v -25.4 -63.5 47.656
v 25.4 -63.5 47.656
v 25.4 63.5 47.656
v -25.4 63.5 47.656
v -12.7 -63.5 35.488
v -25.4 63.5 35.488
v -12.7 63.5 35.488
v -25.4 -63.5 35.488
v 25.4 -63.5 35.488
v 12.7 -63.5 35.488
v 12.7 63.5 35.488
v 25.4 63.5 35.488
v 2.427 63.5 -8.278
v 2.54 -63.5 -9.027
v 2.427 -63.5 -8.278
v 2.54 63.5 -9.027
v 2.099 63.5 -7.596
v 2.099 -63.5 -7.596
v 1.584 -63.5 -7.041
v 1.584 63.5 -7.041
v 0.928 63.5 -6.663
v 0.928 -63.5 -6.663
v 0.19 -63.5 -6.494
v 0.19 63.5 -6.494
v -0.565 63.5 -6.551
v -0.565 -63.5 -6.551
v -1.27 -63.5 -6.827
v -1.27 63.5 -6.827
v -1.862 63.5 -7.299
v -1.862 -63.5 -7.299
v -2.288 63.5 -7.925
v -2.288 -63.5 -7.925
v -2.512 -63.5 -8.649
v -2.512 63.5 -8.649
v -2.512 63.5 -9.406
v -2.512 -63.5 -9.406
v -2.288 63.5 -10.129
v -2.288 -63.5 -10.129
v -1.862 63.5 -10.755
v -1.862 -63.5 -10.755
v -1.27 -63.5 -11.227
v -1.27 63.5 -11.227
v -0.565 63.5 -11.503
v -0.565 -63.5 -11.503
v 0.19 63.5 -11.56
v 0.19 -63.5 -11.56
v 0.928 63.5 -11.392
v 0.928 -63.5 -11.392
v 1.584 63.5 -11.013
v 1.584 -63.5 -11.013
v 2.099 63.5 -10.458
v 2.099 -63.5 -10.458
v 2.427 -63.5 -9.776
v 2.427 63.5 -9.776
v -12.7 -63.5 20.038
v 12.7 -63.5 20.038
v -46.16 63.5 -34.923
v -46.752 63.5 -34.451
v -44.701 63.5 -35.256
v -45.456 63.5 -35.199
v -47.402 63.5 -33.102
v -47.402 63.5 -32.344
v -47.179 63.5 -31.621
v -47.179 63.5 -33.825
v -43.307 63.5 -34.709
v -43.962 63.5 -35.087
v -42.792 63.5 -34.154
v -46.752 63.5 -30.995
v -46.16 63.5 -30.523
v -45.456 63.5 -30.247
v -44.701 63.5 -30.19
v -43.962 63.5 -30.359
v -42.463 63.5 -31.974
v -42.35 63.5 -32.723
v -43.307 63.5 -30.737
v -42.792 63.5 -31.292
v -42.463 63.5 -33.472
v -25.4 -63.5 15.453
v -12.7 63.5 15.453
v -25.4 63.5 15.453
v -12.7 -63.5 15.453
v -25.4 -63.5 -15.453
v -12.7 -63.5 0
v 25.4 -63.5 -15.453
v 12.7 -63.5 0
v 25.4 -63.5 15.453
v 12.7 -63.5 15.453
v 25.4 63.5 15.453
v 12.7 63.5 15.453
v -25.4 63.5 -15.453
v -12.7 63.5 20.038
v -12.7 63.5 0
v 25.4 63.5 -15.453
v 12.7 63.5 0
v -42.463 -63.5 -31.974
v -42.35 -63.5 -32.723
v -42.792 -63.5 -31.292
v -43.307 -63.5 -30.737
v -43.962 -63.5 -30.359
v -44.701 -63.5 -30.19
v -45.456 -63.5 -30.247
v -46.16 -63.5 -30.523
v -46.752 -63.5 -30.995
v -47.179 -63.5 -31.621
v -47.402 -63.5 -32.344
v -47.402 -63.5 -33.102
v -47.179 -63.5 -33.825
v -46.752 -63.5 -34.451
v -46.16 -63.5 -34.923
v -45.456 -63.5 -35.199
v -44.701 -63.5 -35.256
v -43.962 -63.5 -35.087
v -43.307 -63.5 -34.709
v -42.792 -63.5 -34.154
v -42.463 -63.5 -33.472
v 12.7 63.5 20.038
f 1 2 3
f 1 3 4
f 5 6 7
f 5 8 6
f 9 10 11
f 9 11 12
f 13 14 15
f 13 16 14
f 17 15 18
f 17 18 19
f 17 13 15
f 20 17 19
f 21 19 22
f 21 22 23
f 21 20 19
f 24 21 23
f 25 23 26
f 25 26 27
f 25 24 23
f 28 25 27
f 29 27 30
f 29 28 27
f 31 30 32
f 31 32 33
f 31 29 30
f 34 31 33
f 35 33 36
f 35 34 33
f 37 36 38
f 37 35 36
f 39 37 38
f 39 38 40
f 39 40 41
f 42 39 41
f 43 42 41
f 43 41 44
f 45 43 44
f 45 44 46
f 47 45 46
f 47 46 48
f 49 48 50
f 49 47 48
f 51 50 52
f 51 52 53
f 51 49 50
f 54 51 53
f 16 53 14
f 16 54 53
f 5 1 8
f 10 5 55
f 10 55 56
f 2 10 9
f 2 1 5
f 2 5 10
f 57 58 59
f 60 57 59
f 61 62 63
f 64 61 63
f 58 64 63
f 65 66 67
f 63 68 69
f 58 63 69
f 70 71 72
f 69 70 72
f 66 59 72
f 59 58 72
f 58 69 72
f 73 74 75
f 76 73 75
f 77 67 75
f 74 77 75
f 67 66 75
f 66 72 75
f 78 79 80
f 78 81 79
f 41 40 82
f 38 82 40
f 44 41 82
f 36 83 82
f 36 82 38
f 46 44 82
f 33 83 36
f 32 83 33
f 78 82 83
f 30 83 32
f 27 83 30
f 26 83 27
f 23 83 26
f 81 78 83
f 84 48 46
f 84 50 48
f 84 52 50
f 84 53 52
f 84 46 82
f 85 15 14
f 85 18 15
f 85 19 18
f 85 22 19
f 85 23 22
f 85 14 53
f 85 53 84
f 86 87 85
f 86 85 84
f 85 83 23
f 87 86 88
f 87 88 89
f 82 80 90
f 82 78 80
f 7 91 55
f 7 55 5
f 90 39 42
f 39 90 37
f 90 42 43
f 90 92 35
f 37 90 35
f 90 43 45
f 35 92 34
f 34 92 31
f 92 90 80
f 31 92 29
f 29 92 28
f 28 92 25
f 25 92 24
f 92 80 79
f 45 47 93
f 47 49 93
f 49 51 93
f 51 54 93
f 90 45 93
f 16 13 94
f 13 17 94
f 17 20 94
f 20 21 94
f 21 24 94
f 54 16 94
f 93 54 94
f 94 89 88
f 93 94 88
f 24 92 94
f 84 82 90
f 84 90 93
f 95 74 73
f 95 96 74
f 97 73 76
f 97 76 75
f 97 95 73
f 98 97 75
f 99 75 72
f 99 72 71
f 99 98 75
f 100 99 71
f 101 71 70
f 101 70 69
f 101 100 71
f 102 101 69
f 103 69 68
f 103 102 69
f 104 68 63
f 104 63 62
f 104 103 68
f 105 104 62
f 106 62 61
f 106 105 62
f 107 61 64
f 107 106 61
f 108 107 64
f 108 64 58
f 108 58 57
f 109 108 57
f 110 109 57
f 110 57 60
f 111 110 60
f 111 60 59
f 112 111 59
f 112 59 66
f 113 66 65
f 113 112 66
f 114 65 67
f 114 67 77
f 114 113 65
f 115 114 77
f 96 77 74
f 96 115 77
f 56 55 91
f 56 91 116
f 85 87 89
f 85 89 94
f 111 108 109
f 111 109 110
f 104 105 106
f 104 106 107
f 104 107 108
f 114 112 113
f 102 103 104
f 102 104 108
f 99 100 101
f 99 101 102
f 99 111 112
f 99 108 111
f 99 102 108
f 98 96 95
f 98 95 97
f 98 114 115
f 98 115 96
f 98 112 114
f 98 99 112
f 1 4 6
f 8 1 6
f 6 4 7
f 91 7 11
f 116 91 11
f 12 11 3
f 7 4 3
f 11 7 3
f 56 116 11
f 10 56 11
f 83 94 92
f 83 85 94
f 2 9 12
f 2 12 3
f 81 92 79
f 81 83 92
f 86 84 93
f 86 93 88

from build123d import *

# Parameters (mm, degrees)
F0_R     = 2.54
F1_DEPTH = 63.5
F2_W     = 25.4
F2_H     = 15.4505290857
F2_H_2   = 9.0087315817
F3_DEPTH = 63.5
F4_R     = 2.54
F5_DEPTH = 63.5


with BuildPart() as f1:
    # F0 (on Front) → F1 (new body, symmetric)
    with BuildSketch(Plane.XZ):
        Polygon((-25.4, 15.4528948274), (-25.4, -15.4528948274), (25.4, -15.4528948274), (25.4, 15.4528948274), (12.7, 15.4528948274), (12.7, 0), (-12.7, 0), (-12.7, 15.4528948274), align=None)
        with Locations((0, -9.0271038935)):
            Circle(F0_R, mode=Mode.SUBTRACT)
    extrude(amount=F1_DEPTH, both=True)


with BuildPart() as f3:
    # F2 (on Front) → F3 (new body, symmetric)
    with BuildSketch(Plane.XZ):
        with Locations((0, 27.7630429332)):
            Rectangle(F2_W, F2_H)
        Polygon((-25.4, 35.488307476), (-12.7, 35.488307476), (-12.7, 44.4970390577), (12.7, 44.4970390577), (12.7, 35.488307476), (25.4, 35.488307476), (25.4, 47.655723989), (-25.4, 47.655723989), align=None)
        with Locations((0, 39.9926732669)):
            Rectangle(F2_W, F2_H_2)
    extrude(amount=F3_DEPTH, both=True)


with BuildPart() as f5:
    # F4 (on Front) → F5 (new body, symmetric)
    with BuildSketch(Plane.XZ):
        with Locations((-44.8904037476, -32.7229835093)):
            Circle(F4_R)
    extrude(amount=F5_DEPTH, both=True)


solid = Compound([f1.part, f3.part, f5.part])
